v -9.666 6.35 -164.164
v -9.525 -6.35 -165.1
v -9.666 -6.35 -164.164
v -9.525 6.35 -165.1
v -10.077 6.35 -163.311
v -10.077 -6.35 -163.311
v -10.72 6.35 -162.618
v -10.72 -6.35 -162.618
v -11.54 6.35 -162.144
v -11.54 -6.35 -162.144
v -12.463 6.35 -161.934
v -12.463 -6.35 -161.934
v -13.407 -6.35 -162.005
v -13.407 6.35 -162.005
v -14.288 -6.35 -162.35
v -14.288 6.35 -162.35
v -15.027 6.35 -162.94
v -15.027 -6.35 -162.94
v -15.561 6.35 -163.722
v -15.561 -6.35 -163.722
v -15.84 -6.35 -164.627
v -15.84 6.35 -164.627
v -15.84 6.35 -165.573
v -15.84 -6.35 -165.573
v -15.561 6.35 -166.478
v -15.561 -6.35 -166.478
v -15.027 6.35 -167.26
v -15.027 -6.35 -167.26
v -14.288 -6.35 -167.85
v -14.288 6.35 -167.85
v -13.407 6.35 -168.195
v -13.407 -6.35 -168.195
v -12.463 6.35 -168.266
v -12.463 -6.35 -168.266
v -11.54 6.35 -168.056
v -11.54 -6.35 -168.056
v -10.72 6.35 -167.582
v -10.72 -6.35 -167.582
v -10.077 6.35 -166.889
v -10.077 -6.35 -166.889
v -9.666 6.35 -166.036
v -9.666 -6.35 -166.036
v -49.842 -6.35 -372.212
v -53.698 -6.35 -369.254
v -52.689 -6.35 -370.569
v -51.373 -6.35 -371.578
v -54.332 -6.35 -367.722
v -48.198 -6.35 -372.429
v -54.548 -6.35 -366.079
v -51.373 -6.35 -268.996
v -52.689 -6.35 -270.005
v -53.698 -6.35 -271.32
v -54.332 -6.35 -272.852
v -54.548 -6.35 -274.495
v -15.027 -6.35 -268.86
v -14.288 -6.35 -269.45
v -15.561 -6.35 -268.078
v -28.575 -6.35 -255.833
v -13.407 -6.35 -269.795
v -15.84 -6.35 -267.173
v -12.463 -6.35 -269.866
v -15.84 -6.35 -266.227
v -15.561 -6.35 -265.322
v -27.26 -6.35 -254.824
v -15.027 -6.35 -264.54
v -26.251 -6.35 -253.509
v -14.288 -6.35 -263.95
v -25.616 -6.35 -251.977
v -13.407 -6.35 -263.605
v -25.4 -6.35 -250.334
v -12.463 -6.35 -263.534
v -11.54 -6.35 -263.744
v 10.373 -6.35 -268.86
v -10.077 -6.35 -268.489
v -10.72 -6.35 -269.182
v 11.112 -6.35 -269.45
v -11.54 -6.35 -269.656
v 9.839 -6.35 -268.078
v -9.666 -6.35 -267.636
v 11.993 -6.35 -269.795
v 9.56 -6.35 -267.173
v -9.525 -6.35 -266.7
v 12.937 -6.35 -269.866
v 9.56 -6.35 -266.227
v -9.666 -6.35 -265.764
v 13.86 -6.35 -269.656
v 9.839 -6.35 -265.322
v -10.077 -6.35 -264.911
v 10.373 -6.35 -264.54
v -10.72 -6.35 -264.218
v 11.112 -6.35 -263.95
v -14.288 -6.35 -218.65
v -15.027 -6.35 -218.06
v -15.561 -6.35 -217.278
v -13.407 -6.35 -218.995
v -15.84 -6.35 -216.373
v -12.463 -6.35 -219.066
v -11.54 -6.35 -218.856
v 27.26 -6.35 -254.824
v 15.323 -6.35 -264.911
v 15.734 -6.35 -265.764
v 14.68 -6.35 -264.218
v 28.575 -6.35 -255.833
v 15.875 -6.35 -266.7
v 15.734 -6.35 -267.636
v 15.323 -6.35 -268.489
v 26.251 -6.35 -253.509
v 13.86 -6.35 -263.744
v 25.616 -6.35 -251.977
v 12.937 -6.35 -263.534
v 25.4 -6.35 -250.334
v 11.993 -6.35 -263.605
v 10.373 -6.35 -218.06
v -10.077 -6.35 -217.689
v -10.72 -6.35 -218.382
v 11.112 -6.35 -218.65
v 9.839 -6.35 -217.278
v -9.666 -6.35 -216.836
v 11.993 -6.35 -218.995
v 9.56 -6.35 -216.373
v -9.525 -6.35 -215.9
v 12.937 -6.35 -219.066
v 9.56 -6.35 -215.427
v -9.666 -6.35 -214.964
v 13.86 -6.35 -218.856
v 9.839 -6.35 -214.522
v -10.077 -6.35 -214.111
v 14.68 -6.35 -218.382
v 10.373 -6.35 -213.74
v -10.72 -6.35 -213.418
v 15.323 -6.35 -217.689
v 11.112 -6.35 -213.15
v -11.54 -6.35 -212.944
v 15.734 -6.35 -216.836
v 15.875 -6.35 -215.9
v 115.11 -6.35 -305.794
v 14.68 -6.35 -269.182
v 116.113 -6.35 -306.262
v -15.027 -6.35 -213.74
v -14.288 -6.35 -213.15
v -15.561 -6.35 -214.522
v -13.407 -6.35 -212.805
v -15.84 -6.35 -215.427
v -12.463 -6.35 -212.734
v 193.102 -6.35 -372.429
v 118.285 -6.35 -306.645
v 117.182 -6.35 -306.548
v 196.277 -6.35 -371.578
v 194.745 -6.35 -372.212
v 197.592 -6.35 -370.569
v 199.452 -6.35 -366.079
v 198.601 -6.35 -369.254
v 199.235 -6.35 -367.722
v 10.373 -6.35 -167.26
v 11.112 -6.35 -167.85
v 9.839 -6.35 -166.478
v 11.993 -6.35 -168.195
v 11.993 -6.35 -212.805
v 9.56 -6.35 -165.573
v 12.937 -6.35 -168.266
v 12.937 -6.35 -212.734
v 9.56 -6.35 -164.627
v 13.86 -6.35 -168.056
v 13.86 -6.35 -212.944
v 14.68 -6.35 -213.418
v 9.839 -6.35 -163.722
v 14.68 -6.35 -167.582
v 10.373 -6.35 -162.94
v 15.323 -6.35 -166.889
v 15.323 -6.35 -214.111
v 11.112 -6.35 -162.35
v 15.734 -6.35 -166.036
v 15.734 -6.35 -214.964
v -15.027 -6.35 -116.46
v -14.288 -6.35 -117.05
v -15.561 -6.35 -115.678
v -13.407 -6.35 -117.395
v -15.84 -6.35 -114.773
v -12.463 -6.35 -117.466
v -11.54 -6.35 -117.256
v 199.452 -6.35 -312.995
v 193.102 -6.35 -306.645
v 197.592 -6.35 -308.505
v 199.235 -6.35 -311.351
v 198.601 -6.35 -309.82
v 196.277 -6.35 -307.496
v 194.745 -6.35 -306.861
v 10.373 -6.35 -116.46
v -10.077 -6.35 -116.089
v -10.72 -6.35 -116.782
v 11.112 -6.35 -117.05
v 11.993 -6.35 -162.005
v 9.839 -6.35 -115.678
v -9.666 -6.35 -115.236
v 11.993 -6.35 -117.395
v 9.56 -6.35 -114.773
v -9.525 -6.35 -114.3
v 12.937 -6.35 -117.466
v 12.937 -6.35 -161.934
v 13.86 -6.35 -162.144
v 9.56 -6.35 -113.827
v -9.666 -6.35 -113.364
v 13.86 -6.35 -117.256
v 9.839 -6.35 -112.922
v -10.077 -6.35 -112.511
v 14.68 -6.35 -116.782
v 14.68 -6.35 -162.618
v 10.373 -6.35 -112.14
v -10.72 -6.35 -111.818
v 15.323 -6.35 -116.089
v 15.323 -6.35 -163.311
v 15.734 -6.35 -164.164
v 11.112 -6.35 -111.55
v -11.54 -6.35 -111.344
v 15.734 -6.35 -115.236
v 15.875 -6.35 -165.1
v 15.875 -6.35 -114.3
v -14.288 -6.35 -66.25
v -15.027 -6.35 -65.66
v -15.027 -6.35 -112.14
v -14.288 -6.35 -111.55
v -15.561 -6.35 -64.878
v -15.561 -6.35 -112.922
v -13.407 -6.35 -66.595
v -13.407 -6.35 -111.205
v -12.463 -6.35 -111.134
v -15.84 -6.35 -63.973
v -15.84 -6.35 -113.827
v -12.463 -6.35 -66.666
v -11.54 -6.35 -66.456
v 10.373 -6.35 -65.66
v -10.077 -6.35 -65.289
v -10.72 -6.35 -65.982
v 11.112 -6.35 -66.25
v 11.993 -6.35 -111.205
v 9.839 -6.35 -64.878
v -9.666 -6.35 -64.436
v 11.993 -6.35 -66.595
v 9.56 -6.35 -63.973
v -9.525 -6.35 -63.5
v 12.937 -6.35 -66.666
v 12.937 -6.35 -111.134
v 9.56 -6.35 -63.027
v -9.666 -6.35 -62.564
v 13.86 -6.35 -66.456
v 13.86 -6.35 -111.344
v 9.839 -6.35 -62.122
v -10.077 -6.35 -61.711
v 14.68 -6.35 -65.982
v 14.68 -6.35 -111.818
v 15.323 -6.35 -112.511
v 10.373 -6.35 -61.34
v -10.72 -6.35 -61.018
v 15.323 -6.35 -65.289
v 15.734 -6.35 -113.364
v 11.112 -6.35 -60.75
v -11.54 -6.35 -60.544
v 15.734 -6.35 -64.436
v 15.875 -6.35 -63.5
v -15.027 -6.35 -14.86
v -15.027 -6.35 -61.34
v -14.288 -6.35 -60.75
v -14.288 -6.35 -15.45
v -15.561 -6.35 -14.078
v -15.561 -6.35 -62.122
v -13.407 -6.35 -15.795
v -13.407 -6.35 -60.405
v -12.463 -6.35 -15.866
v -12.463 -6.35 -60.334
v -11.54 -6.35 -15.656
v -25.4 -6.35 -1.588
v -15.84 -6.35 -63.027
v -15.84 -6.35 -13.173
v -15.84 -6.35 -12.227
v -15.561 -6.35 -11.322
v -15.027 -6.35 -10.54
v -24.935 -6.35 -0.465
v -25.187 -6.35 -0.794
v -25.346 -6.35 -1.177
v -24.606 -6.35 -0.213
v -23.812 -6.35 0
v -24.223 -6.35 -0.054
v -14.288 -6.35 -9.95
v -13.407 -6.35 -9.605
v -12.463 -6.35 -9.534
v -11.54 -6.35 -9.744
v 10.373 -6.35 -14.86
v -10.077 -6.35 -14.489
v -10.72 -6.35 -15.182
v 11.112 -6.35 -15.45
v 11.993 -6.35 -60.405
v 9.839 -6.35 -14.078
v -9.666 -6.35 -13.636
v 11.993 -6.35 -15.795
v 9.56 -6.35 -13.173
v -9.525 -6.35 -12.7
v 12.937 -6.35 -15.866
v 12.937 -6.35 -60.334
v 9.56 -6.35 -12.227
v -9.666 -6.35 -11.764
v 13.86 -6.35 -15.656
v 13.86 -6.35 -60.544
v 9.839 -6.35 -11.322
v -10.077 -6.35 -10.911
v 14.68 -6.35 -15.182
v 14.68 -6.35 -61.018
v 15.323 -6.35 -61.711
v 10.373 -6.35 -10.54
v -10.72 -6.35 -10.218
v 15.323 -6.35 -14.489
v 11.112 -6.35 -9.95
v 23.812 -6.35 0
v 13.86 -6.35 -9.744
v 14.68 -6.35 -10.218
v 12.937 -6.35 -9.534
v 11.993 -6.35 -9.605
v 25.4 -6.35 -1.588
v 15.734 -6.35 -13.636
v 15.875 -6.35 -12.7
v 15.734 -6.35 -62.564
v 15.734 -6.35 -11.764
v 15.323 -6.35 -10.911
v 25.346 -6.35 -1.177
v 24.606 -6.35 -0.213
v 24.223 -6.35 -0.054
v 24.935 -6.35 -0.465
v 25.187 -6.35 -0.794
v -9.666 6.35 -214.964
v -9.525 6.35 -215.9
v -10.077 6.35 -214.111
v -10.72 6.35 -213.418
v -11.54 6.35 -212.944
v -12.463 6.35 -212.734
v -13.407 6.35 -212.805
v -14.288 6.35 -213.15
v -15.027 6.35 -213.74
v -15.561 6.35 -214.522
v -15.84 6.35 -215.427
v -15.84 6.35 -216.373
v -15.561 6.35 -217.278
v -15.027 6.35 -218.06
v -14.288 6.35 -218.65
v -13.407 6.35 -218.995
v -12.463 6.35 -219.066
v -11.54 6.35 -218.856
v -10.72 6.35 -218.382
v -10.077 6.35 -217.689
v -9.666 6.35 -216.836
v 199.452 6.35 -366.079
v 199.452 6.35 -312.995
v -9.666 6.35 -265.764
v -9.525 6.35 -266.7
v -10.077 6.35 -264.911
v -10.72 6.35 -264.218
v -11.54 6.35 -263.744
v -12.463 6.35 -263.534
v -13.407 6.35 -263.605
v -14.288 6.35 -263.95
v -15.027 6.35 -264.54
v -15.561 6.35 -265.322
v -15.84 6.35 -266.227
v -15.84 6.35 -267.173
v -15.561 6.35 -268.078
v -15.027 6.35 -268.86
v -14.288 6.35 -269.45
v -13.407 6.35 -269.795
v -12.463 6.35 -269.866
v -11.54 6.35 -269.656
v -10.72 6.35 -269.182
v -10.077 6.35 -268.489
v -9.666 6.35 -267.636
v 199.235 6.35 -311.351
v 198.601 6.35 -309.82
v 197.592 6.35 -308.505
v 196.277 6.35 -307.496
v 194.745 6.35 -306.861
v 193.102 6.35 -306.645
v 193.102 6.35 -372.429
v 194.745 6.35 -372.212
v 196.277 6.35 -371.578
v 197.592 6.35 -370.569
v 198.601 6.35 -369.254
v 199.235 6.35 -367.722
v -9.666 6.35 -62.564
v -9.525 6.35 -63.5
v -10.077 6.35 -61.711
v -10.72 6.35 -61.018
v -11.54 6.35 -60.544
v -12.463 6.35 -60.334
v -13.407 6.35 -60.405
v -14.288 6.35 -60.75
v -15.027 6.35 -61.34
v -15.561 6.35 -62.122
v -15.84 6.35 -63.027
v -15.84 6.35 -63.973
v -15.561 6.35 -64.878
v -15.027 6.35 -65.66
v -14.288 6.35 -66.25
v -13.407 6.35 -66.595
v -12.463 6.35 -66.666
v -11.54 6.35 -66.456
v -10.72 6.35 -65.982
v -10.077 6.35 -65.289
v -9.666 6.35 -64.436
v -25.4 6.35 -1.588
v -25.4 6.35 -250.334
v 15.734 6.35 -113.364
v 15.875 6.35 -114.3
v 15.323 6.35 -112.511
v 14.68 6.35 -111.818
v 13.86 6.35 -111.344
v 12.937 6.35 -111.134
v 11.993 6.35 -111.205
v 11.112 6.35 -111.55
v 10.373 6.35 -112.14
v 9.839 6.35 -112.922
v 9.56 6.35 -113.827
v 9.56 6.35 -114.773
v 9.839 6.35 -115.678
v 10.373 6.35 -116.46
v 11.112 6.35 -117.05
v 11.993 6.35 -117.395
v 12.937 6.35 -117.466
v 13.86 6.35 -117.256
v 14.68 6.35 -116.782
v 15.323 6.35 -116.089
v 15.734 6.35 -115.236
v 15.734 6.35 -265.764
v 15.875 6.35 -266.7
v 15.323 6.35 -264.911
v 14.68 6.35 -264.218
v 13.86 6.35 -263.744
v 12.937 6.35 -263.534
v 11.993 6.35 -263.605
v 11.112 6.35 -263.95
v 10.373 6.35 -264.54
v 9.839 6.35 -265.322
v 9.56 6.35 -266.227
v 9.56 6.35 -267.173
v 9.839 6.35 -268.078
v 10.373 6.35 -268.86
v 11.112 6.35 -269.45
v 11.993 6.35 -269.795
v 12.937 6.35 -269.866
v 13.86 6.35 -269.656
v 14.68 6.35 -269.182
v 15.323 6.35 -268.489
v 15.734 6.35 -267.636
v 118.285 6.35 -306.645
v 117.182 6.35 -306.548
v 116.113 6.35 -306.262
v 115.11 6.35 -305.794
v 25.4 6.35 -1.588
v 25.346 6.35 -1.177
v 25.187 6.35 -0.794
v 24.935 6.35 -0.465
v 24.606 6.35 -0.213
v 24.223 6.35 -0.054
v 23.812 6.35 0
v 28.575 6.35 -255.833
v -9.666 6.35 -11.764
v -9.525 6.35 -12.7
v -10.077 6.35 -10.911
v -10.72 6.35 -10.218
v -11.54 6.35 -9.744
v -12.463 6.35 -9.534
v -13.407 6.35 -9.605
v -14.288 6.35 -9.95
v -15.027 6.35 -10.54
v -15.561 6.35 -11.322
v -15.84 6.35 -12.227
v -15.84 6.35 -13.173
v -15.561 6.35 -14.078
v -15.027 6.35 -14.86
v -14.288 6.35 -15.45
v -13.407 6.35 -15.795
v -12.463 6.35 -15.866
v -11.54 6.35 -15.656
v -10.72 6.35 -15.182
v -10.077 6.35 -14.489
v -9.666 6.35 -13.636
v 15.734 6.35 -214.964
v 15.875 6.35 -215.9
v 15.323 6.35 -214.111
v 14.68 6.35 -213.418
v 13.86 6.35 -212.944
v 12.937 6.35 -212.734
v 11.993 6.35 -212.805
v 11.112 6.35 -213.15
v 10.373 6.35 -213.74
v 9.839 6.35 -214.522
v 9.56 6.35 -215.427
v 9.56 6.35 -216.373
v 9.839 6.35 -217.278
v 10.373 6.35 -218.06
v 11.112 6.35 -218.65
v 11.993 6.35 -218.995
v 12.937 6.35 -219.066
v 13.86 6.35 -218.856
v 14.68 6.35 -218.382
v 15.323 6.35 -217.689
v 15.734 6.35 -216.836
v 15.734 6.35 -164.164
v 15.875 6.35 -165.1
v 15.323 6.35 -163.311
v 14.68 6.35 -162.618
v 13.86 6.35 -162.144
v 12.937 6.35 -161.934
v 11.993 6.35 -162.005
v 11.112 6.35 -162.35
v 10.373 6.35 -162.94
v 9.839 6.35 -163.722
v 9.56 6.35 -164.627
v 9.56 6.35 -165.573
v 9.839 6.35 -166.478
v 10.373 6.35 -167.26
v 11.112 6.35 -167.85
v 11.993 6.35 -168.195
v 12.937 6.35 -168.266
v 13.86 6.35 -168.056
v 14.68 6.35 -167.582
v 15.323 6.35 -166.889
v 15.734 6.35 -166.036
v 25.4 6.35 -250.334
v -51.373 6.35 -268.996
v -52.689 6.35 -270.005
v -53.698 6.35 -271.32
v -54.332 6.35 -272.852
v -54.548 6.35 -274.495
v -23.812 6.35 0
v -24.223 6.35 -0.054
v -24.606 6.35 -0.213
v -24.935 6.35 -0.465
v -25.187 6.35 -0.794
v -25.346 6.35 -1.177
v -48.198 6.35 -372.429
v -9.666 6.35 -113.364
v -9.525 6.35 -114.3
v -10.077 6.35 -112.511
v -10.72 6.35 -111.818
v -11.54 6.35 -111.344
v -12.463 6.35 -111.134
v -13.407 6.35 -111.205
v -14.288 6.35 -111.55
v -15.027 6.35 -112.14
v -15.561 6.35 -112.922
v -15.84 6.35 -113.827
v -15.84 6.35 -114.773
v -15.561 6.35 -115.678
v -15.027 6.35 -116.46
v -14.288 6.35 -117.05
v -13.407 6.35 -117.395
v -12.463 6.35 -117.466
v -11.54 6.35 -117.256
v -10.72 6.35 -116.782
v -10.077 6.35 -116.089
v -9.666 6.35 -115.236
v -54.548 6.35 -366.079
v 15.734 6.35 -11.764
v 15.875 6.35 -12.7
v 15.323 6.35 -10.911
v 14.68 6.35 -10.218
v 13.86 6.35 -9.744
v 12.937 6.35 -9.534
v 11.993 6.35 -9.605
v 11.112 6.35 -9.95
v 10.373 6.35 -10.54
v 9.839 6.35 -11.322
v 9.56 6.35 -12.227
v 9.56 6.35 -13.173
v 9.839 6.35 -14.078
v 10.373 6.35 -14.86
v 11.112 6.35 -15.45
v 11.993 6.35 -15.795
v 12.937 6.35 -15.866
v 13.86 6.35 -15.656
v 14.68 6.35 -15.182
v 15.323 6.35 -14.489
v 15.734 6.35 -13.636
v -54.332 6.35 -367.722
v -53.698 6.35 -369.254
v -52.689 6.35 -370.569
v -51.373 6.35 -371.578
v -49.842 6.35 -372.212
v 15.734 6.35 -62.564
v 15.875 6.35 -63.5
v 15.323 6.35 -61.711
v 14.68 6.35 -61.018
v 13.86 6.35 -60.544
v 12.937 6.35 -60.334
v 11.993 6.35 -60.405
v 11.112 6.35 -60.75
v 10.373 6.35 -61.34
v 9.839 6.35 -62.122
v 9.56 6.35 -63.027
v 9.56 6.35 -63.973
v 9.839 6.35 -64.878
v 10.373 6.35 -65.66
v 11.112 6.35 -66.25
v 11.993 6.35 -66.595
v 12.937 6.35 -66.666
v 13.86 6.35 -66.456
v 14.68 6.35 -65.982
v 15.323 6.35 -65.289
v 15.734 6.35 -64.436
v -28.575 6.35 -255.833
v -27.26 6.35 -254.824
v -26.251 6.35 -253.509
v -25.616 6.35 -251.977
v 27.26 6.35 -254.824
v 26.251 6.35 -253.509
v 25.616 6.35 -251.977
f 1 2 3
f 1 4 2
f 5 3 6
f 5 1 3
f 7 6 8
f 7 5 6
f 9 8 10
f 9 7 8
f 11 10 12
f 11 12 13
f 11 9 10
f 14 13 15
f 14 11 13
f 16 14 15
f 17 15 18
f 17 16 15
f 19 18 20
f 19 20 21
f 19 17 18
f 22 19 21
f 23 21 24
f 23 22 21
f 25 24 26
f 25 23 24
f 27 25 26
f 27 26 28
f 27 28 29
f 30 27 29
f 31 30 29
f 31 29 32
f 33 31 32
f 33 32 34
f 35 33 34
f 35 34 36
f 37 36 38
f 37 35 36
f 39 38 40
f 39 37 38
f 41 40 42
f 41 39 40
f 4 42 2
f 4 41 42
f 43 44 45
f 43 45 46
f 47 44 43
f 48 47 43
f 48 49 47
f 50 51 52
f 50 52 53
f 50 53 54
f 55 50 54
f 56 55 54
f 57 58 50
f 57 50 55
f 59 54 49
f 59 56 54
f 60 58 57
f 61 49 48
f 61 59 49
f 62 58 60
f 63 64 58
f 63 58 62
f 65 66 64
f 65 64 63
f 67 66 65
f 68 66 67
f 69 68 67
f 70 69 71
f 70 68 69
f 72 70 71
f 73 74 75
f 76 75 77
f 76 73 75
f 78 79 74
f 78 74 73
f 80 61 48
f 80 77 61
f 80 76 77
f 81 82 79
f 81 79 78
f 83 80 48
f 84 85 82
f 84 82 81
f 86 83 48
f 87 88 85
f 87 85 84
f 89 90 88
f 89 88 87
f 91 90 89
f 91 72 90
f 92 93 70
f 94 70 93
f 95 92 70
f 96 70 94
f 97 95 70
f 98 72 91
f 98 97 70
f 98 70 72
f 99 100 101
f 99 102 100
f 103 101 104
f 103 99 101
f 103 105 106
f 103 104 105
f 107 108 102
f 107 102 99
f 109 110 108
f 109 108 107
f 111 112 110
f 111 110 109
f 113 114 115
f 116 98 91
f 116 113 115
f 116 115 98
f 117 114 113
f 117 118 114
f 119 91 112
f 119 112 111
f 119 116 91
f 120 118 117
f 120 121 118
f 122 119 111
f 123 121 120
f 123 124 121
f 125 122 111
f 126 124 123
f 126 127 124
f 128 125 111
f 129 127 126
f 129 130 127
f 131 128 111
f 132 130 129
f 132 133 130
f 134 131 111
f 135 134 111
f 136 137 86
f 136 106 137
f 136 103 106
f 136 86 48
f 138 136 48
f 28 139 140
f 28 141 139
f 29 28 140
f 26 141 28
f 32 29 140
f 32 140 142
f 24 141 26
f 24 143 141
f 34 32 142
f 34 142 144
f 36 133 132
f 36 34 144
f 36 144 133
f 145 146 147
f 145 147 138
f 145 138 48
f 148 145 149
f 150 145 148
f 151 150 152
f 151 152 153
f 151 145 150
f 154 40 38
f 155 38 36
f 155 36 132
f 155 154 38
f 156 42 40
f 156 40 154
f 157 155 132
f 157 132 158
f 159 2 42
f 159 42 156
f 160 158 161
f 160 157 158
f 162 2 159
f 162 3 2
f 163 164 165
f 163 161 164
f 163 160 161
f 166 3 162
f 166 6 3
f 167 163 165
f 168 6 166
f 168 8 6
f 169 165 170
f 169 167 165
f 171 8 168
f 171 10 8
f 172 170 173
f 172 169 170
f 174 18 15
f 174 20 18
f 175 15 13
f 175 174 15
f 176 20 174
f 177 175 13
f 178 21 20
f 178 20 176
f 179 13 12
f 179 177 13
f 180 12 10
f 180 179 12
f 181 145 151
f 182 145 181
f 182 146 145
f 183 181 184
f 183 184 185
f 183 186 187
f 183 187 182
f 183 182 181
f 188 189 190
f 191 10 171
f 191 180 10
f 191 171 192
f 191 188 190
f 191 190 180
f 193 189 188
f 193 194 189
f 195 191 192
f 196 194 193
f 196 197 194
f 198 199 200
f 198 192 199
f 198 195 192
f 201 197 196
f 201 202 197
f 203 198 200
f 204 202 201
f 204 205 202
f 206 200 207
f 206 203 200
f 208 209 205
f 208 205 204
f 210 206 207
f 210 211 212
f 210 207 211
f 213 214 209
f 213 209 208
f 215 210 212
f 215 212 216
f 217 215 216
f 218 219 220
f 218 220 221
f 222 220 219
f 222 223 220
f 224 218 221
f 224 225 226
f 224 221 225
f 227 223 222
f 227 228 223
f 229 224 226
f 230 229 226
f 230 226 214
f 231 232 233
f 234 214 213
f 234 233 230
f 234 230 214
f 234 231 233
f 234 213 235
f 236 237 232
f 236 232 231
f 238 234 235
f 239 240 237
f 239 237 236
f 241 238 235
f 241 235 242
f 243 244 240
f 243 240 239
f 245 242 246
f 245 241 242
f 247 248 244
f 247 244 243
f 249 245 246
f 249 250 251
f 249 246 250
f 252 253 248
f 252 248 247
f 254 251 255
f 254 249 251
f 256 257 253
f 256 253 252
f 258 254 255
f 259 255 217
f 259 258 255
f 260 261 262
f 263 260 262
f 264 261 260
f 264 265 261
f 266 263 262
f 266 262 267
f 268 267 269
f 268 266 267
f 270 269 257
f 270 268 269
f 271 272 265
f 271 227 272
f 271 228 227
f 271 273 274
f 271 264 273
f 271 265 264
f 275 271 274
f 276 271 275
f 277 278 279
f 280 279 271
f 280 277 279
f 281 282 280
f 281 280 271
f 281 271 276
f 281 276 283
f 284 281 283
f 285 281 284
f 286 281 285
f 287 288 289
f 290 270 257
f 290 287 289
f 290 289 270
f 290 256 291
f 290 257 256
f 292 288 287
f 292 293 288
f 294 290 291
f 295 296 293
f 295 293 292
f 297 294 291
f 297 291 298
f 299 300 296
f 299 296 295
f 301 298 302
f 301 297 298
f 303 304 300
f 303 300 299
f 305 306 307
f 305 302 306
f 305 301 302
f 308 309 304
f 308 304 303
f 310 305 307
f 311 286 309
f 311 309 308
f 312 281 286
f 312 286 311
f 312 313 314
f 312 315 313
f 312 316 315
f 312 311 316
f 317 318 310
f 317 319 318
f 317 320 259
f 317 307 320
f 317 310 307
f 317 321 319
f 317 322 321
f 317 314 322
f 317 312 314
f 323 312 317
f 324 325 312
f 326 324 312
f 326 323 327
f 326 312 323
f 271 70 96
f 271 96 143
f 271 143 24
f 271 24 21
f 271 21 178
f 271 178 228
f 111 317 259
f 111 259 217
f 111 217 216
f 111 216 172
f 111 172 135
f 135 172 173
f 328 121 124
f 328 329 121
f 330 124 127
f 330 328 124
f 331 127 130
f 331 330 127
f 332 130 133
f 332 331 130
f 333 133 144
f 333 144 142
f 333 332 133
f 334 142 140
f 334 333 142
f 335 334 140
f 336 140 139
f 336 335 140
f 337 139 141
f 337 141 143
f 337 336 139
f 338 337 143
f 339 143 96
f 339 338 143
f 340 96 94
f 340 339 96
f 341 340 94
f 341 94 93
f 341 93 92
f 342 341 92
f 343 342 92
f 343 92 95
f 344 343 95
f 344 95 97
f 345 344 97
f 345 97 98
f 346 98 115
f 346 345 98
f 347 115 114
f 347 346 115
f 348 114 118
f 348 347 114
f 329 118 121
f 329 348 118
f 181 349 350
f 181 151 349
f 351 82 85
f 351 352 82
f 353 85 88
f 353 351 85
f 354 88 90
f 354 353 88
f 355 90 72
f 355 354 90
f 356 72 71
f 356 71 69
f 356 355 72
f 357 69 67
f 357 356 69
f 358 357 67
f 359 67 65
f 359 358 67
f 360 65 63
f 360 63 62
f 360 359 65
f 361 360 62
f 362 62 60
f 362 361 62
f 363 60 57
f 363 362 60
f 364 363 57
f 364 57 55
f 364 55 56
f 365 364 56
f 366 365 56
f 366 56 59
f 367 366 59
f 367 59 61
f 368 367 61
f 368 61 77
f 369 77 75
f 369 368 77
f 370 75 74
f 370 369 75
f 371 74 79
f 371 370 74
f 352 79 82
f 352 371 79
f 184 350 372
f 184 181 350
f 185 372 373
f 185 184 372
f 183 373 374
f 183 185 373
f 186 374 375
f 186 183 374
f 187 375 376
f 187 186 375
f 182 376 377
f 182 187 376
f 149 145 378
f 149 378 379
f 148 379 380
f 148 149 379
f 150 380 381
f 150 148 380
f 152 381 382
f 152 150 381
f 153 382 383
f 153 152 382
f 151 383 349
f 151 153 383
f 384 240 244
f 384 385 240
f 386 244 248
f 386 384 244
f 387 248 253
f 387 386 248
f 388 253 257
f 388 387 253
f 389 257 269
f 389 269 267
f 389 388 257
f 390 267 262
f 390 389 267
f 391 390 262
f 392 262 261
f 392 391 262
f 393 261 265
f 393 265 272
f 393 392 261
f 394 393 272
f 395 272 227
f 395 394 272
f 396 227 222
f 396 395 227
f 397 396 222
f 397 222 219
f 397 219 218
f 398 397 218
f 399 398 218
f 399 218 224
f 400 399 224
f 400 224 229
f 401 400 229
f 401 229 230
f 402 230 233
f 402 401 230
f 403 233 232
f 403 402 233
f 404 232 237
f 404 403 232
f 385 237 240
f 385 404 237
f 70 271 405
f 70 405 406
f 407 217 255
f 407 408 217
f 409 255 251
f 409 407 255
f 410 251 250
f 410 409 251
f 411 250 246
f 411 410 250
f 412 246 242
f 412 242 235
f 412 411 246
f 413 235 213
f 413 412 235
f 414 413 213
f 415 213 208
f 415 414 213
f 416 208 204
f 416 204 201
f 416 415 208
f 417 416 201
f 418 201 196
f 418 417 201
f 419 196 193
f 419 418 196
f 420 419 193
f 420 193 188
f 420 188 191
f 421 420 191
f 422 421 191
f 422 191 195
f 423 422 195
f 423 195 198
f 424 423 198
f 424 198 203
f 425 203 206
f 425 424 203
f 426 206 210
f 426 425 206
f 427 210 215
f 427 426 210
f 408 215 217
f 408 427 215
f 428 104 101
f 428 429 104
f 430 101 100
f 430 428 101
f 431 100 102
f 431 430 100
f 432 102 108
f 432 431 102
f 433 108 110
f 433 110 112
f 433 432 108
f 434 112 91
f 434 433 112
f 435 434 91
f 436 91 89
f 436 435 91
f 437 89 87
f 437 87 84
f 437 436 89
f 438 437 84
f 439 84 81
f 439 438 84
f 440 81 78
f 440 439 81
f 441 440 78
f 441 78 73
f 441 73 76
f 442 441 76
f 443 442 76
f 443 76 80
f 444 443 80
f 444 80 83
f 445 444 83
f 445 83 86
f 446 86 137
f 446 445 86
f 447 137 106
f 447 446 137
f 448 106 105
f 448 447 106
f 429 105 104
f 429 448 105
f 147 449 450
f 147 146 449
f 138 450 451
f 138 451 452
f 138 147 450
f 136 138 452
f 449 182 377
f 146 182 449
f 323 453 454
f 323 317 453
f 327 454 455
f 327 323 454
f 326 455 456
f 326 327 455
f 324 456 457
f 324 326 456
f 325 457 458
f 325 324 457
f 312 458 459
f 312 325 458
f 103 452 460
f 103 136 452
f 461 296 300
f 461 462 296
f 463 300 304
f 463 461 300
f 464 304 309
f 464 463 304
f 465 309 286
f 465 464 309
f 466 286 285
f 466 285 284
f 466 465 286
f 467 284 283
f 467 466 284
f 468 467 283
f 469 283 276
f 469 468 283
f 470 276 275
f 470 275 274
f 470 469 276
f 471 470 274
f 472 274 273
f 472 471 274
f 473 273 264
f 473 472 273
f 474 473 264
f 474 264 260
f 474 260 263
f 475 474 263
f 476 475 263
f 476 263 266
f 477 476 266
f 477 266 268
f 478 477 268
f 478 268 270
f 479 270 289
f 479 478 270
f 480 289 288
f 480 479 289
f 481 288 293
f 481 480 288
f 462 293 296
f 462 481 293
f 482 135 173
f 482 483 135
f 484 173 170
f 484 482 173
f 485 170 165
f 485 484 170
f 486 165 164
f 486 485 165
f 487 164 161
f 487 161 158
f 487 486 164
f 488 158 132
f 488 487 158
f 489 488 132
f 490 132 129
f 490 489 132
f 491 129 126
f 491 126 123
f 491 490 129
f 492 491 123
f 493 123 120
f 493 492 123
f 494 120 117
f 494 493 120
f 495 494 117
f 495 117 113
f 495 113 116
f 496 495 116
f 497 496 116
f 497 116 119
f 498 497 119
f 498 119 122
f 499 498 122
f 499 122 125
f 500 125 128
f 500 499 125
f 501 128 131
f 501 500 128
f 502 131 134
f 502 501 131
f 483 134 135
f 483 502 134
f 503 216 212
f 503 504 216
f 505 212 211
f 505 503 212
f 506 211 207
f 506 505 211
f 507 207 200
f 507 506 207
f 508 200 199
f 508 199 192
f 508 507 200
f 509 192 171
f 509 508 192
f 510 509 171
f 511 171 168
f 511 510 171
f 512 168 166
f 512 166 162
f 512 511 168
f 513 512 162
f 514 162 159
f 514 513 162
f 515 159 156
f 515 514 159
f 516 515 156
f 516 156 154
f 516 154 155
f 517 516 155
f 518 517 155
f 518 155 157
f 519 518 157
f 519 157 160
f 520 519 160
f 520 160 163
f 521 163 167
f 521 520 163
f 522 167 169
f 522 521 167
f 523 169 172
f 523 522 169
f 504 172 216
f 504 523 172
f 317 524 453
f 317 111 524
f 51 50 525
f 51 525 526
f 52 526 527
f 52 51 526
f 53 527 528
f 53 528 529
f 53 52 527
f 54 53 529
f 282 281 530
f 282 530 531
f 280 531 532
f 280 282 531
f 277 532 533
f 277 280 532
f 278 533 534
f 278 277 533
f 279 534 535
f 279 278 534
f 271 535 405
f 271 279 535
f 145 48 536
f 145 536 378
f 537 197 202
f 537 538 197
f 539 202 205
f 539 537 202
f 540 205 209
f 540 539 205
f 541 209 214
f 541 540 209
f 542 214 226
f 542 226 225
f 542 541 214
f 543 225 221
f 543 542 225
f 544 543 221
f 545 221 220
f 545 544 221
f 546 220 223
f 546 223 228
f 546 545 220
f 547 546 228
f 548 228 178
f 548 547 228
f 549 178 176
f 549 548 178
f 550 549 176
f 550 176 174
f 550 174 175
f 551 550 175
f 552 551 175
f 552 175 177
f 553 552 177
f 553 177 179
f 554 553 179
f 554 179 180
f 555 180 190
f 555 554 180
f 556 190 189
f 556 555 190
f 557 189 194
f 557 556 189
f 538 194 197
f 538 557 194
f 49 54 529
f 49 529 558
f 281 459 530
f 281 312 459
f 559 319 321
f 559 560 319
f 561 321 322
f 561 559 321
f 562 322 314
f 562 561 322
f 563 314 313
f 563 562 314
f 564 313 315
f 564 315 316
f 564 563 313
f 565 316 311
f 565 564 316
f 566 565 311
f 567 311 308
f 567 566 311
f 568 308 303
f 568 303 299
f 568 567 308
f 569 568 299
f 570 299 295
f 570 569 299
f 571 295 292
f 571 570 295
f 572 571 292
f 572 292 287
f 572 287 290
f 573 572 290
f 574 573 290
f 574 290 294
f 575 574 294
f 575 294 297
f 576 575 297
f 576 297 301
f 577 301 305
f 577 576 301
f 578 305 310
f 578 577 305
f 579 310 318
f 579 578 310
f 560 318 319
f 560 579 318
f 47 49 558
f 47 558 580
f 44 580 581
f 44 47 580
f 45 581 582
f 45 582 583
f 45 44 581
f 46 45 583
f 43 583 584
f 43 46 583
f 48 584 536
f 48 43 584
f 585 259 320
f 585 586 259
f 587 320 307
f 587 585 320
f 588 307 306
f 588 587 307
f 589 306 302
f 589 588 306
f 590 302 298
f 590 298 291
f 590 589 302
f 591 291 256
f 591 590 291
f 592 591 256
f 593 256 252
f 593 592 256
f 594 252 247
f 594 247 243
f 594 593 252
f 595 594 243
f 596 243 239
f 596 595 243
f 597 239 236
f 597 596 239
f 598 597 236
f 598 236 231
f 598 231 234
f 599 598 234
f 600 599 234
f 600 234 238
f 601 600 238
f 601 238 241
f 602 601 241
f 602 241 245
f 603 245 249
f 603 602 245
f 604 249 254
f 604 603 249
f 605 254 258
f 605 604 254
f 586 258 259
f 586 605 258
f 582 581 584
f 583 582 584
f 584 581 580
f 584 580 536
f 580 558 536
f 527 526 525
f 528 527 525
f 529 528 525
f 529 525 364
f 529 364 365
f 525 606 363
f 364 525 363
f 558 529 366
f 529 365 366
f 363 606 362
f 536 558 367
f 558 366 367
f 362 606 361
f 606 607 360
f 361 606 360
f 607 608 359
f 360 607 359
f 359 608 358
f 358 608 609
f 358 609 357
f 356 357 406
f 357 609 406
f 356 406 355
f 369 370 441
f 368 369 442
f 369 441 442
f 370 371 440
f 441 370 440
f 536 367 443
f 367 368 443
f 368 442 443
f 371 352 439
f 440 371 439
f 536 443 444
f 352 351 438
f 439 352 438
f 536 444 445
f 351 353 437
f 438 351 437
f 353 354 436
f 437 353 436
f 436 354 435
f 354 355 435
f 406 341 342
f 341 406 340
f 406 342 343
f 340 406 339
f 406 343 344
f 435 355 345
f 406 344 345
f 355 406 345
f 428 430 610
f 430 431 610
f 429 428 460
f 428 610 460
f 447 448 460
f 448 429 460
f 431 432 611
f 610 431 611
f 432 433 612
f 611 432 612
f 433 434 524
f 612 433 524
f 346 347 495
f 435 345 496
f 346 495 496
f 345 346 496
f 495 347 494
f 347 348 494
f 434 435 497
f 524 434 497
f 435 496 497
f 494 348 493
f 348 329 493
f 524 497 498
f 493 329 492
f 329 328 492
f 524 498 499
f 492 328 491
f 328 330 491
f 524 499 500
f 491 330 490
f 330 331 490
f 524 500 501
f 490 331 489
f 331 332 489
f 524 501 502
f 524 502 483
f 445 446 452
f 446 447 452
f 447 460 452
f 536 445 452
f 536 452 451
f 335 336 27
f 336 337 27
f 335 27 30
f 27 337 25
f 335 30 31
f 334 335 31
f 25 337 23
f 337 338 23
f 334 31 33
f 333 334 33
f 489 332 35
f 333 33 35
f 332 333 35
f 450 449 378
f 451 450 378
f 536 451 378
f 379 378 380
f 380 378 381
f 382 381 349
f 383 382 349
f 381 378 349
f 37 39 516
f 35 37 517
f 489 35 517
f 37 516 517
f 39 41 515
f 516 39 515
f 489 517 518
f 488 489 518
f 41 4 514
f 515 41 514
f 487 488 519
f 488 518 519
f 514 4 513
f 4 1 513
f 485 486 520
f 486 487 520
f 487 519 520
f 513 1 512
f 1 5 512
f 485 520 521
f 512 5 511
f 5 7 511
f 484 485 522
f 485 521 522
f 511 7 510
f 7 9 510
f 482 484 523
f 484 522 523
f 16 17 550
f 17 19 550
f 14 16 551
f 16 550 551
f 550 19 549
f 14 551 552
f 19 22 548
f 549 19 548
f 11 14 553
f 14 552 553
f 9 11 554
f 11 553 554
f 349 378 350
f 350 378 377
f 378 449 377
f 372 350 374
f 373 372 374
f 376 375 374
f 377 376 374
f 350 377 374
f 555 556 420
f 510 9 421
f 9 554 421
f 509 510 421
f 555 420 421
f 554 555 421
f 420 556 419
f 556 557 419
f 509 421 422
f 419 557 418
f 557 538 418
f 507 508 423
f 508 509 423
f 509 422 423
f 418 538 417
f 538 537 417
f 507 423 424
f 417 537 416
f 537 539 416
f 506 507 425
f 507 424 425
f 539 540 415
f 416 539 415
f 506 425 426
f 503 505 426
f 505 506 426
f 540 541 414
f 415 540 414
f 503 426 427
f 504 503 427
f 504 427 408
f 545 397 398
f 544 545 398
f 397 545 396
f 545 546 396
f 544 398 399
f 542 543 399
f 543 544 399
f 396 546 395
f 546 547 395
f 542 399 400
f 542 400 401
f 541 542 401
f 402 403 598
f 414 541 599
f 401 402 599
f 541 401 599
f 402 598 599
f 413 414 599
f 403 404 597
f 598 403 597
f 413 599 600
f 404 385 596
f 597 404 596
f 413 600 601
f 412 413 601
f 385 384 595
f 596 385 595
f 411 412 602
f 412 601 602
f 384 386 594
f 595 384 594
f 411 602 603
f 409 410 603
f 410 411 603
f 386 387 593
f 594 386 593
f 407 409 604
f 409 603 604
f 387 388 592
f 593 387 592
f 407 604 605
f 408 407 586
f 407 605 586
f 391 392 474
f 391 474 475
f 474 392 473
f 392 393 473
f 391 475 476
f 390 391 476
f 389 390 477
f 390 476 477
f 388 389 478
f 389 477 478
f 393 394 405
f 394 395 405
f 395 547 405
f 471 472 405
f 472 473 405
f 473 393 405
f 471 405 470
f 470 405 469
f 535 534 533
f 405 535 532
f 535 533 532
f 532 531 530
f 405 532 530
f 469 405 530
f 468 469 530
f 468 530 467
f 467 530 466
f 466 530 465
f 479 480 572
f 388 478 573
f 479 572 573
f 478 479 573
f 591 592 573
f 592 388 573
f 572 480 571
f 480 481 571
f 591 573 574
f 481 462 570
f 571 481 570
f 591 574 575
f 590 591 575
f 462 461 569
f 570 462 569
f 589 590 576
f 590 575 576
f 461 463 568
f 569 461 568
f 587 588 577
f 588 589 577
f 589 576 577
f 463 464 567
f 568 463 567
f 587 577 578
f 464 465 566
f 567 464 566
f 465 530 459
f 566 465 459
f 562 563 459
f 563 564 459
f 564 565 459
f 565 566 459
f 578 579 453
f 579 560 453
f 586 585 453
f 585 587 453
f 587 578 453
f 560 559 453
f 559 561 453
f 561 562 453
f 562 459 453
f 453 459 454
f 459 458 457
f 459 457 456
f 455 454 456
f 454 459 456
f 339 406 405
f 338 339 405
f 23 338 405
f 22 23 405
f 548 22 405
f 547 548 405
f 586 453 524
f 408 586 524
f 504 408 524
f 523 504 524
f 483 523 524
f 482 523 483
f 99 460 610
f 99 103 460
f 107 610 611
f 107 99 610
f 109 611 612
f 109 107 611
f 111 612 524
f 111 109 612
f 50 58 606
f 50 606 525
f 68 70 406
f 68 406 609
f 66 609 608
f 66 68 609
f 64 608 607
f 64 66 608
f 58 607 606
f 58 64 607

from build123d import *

# Parameters (mm, degrees)
F0_R     = 3.175
F1_DEPTH = 6.35


with BuildPart() as f1:
    # F0 (on Front) → F1 (new body, symmetric)
    with BuildSketch(Plane.XZ):
        with BuildLine():
            Line((23.8125, 0), (-23.8125, 0))
            ThreePointArc((-23.8125, 0), (-24.935032, -0.464968), (-25.4, -1.5875))
            Line((-25.4, -1.5875), (-25.4, -250.333826))
            ThreePointArc((-25.4, -250.333826), (-26.250739, -253.508826), (-28.575, -255.833087))
            Line((-28.575, -255.833087), (-51.373449, -268.995778))
            ThreePointArc((-51.373449, -268.995778), (-53.697711, -271.320039), (-54.548449, -274.495039))
            Line((-54.548449, -274.495039), (-54.548449, -366.078865))
            ThreePointArc((-54.548449, -366.078865), (-52.688577, -370.568993), (-48.198449, -372.428865))
            Line((-48.198449, -372.428865), (193.101551, -372.428865))
            ThreePointArc((193.101551, -372.428865), (197.591679, -370.568993), (199.451551, -366.078865))
            Line((199.451551, -366.078865), (199.451551, -312.994769))
            ThreePointArc((199.451551, -312.994769), (197.591679, -308.504641), (193.101551, -306.644769))
            Line((193.101551, -306.644769), (118.284892, -306.644769))
            ThreePointArc((118.284892, -306.644769), (116.641391, -306.428398), (115.109892, -305.79403))
            Line((115.109892, -305.79403), (28.575, -255.833087))
            ThreePointArc((28.575, -255.833087), (26.250739, -253.508826), (25.4, -250.333826))
            Line((25.4, -250.333826), (25.4, -1.5875))
            ThreePointArc((25.4, -1.5875), (24.935032, -0.464968), (23.8125, 0))
        make_face()
        with Locations((-12.7, -266.7)):
            Circle(F0_R, mode=Mode.SUBTRACT)
        with Locations((-12.7, -215.9)):
            Circle(F0_R, mode=Mode.SUBTRACT)
        with Locations((12.7, -266.7)):
            Circle(F0_R, mode=Mode.SUBTRACT)
        with Locations((12.7, -215.9)):
            Circle(F0_R, mode=Mode.SUBTRACT)
        with Locations((-12.7, -165.1)):
            Circle(F0_R, mode=Mode.SUBTRACT)
        with Locations((-12.7, -114.3)):
            Circle(F0_R, mode=Mode.SUBTRACT)
        with Locations((12.7, -165.1)):
            Circle(F0_R, mode=Mode.SUBTRACT)
        with Locations((12.7, -114.3)):
            Circle(F0_R, mode=Mode.SUBTRACT)
        with Locations((-12.7, -63.5)):
            Circle(F0_R, mode=Mode.SUBTRACT)
        with Locations((-12.7, -12.7)):
            Circle(F0_R, mode=Mode.SUBTRACT)
        with Locations((12.7, -63.5)):
            Circle(F0_R, mode=Mode.SUBTRACT)
        with Locations((12.7, -12.7)):
            Circle(F0_R, mode=Mode.SUBTRACT)
    extrude(amount=F1_DEPTH, both=True)


solid = f1.part
